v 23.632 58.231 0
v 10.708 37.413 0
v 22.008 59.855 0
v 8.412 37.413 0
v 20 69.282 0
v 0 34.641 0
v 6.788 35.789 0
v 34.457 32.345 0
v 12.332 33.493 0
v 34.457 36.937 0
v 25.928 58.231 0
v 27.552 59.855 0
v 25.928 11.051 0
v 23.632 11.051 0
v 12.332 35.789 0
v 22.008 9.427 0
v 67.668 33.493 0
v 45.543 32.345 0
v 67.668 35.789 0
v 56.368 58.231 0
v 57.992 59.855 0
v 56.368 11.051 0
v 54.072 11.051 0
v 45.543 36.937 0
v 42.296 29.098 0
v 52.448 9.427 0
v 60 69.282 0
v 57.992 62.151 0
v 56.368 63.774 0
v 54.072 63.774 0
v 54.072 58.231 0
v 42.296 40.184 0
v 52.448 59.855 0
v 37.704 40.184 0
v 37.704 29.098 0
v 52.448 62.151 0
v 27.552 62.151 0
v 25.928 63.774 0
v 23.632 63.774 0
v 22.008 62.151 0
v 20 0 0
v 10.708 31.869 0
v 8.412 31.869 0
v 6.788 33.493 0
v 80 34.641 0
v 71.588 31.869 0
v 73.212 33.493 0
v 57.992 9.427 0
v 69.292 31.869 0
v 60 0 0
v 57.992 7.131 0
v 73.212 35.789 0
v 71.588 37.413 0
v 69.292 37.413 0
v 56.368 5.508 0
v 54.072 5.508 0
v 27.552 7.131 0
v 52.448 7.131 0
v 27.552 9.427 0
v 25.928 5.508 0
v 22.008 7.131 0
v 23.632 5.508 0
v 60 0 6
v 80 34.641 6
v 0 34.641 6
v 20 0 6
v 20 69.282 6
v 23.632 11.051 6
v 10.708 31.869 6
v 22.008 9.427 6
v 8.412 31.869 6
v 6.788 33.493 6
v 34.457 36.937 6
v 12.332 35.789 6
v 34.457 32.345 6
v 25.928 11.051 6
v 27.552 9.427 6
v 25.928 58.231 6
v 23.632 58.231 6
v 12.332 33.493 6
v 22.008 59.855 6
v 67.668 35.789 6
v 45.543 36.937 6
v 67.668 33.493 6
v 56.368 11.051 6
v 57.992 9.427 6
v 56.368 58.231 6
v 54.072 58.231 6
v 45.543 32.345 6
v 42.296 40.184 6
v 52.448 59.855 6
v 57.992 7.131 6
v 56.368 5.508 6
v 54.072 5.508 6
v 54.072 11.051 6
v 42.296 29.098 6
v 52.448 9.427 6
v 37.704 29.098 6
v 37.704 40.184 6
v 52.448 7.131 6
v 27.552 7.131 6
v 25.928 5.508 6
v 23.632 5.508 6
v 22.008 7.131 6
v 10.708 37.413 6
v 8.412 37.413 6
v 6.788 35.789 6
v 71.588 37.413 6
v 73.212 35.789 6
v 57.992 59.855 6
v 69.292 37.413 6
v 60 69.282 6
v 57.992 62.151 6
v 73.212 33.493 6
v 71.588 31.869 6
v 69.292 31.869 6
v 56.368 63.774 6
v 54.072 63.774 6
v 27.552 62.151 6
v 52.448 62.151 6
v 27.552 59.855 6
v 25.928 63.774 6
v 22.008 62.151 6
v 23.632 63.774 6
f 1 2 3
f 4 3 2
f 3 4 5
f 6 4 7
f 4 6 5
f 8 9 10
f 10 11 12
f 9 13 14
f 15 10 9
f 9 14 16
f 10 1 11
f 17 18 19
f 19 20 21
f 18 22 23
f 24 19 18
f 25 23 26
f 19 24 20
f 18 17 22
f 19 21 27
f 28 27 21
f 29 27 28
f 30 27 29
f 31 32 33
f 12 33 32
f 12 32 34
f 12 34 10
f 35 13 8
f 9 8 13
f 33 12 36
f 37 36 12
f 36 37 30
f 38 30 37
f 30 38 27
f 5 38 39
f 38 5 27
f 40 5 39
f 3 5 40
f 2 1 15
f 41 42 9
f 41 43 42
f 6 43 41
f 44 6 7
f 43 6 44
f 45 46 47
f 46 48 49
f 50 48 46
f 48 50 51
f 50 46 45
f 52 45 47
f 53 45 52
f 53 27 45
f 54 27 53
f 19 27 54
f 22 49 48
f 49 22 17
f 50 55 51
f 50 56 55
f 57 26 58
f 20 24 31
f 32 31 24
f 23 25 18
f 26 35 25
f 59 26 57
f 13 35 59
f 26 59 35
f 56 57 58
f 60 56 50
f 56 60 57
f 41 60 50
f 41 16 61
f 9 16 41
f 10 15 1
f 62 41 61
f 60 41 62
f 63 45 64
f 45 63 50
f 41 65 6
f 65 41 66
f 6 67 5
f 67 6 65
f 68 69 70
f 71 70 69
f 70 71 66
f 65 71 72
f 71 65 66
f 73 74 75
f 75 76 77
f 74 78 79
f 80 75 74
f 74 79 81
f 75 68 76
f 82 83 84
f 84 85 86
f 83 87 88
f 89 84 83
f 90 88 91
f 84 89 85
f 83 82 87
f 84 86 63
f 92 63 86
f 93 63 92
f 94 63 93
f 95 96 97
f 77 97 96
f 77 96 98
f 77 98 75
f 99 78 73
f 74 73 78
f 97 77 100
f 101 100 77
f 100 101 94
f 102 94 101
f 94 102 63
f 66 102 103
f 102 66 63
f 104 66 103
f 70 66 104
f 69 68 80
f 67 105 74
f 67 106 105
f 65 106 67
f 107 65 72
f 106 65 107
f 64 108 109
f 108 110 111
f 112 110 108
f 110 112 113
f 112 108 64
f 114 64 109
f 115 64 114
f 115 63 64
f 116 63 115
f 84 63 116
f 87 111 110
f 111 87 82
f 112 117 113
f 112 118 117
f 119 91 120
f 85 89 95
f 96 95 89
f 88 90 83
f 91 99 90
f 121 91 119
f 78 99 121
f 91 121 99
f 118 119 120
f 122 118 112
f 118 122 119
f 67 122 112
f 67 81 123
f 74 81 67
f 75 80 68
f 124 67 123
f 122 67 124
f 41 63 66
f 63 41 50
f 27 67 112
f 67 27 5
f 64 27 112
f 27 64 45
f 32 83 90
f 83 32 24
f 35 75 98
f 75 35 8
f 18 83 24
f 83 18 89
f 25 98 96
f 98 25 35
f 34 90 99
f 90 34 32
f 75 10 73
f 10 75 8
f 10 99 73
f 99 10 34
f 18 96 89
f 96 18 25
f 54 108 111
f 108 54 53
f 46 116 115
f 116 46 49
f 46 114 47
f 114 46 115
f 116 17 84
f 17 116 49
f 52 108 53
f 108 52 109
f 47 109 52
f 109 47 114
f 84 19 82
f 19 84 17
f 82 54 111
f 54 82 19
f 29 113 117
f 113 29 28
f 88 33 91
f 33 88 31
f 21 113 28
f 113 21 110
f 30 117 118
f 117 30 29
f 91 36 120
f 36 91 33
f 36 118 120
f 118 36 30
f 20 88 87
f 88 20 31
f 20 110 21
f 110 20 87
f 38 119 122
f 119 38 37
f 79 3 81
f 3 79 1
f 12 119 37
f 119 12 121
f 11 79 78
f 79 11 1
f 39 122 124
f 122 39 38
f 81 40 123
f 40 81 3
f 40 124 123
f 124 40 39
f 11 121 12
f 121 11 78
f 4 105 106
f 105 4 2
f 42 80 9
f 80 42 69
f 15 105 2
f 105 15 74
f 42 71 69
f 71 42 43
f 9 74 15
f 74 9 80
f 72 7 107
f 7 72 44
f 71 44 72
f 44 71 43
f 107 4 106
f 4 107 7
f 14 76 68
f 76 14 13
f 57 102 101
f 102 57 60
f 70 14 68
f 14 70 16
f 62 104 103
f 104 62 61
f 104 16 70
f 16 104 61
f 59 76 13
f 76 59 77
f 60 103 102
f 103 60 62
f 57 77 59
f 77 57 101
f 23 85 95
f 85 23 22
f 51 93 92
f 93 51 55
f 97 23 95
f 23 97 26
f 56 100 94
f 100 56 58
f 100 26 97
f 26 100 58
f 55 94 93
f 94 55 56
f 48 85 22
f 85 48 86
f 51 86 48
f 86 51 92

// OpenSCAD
$fn = 32;

// ----------------------------------------------------------------------
// Polygon plate: 6-gon R40, 6 bolt windows
// ----------------------------------------------------------------------

// --- parameters (mm) ---
sides = 6;                // number of polygon sides
plate_r = 40;             // circumscribed radius of the polygon
bore_r = 6;               // centre bore radius
bolts = 6;                // number of bolt windows
ring_r = 30.44;           // bolt-circle radius
bolt_r = 3;               // bolt window radius
plate_t = 6;              // plate thickness, Z (extrusion height)

plate_d = 2 * plate_r;  // circumscribed diameter
bore_d = 2 * bore_r;  // centre bore diameter
bolt_d = 2 * bolt_r;  // bolt window diameter
ring_d = 2 * ring_r;  // bolt-circle diameter

profile = [[80, 34.641], [60, 69.282], [20, 69.282], [0, 34.641], [20, 0], [60, 0]];  // primary outline, 6 points, counter clockwise
void_1 = [[45.543, 36.937], [42.296, 40.184], [37.704, 40.184], [34.457, 36.937], [34.457, 32.345], [37.704, 29.098], [42.296, 29.098], [45.543, 32.345]];  // centre bore, 8 points
void_2 = [[73.212, 35.789], [71.588, 37.413], [69.292, 37.413], [67.668, 35.789], [67.668, 33.493], [69.292, 31.869], [71.588, 31.869], [73.212, 33.493]];  // bolt window 1, 8 points
void_3 = [[57.992, 62.151], [56.368, 63.774], [54.072, 63.774], [52.448, 62.151], [52.448, 59.855], [54.072, 58.231], [56.368, 58.231], [57.992, 59.855]];  // bolt window 2, 8 points
void_4 = [[27.552, 62.151], [25.928, 63.774], [23.632, 63.774], [22.008, 62.151], [22.008, 59.855], [23.632, 58.231], [25.928, 58.231], [27.552, 59.855]];  // bolt window 3, 8 points
void_5 = [[12.332, 35.789], [10.708, 37.413], [8.412, 37.413], [6.788, 35.789], [6.788, 33.493], [8.412, 31.869], [10.708, 31.869], [12.332, 33.493]];  // bolt window 4, 8 points
void_6 = [[27.552, 9.427], [25.928, 11.051], [23.632, 11.051], [22.008, 9.427], [22.008, 7.131], [23.632, 5.508], [25.928, 5.508], [27.552, 7.131]];  // bolt window 5, 8 points
void_7 = [[57.992, 9.427], [56.368, 11.051], [54.072, 11.051], [52.448, 9.427], [52.448, 7.131], [54.072, 5.508], [56.368, 5.508], [57.992, 7.131]];  // bolt window 6, 8 points

// --- the one profile operation ---
difference() {
  linear_extrude(height = plate_t) polygon(points = profile);
  translate([0, 0, -1])
    linear_extrude(height = plate_t + 2) polygon(points = void_1);
  translate([0, 0, -1])
    linear_extrude(height = plate_t + 2) polygon(points = void_2);
  translate([0, 0, -1])
    linear_extrude(height = plate_t + 2) polygon(points = void_3);
  translate([0, 0, -1])
    linear_extrude(height = plate_t + 2) polygon(points = void_4);
  translate([0, 0, -1])
    linear_extrude(height = plate_t + 2) polygon(points = void_5);
  translate([0, 0, -1])
    linear_extrude(height = plate_t + 2) polygon(points = void_6);
  translate([0, 0, -1])
    linear_extrude(height = plate_t + 2) polygon(points = void_7);
}
